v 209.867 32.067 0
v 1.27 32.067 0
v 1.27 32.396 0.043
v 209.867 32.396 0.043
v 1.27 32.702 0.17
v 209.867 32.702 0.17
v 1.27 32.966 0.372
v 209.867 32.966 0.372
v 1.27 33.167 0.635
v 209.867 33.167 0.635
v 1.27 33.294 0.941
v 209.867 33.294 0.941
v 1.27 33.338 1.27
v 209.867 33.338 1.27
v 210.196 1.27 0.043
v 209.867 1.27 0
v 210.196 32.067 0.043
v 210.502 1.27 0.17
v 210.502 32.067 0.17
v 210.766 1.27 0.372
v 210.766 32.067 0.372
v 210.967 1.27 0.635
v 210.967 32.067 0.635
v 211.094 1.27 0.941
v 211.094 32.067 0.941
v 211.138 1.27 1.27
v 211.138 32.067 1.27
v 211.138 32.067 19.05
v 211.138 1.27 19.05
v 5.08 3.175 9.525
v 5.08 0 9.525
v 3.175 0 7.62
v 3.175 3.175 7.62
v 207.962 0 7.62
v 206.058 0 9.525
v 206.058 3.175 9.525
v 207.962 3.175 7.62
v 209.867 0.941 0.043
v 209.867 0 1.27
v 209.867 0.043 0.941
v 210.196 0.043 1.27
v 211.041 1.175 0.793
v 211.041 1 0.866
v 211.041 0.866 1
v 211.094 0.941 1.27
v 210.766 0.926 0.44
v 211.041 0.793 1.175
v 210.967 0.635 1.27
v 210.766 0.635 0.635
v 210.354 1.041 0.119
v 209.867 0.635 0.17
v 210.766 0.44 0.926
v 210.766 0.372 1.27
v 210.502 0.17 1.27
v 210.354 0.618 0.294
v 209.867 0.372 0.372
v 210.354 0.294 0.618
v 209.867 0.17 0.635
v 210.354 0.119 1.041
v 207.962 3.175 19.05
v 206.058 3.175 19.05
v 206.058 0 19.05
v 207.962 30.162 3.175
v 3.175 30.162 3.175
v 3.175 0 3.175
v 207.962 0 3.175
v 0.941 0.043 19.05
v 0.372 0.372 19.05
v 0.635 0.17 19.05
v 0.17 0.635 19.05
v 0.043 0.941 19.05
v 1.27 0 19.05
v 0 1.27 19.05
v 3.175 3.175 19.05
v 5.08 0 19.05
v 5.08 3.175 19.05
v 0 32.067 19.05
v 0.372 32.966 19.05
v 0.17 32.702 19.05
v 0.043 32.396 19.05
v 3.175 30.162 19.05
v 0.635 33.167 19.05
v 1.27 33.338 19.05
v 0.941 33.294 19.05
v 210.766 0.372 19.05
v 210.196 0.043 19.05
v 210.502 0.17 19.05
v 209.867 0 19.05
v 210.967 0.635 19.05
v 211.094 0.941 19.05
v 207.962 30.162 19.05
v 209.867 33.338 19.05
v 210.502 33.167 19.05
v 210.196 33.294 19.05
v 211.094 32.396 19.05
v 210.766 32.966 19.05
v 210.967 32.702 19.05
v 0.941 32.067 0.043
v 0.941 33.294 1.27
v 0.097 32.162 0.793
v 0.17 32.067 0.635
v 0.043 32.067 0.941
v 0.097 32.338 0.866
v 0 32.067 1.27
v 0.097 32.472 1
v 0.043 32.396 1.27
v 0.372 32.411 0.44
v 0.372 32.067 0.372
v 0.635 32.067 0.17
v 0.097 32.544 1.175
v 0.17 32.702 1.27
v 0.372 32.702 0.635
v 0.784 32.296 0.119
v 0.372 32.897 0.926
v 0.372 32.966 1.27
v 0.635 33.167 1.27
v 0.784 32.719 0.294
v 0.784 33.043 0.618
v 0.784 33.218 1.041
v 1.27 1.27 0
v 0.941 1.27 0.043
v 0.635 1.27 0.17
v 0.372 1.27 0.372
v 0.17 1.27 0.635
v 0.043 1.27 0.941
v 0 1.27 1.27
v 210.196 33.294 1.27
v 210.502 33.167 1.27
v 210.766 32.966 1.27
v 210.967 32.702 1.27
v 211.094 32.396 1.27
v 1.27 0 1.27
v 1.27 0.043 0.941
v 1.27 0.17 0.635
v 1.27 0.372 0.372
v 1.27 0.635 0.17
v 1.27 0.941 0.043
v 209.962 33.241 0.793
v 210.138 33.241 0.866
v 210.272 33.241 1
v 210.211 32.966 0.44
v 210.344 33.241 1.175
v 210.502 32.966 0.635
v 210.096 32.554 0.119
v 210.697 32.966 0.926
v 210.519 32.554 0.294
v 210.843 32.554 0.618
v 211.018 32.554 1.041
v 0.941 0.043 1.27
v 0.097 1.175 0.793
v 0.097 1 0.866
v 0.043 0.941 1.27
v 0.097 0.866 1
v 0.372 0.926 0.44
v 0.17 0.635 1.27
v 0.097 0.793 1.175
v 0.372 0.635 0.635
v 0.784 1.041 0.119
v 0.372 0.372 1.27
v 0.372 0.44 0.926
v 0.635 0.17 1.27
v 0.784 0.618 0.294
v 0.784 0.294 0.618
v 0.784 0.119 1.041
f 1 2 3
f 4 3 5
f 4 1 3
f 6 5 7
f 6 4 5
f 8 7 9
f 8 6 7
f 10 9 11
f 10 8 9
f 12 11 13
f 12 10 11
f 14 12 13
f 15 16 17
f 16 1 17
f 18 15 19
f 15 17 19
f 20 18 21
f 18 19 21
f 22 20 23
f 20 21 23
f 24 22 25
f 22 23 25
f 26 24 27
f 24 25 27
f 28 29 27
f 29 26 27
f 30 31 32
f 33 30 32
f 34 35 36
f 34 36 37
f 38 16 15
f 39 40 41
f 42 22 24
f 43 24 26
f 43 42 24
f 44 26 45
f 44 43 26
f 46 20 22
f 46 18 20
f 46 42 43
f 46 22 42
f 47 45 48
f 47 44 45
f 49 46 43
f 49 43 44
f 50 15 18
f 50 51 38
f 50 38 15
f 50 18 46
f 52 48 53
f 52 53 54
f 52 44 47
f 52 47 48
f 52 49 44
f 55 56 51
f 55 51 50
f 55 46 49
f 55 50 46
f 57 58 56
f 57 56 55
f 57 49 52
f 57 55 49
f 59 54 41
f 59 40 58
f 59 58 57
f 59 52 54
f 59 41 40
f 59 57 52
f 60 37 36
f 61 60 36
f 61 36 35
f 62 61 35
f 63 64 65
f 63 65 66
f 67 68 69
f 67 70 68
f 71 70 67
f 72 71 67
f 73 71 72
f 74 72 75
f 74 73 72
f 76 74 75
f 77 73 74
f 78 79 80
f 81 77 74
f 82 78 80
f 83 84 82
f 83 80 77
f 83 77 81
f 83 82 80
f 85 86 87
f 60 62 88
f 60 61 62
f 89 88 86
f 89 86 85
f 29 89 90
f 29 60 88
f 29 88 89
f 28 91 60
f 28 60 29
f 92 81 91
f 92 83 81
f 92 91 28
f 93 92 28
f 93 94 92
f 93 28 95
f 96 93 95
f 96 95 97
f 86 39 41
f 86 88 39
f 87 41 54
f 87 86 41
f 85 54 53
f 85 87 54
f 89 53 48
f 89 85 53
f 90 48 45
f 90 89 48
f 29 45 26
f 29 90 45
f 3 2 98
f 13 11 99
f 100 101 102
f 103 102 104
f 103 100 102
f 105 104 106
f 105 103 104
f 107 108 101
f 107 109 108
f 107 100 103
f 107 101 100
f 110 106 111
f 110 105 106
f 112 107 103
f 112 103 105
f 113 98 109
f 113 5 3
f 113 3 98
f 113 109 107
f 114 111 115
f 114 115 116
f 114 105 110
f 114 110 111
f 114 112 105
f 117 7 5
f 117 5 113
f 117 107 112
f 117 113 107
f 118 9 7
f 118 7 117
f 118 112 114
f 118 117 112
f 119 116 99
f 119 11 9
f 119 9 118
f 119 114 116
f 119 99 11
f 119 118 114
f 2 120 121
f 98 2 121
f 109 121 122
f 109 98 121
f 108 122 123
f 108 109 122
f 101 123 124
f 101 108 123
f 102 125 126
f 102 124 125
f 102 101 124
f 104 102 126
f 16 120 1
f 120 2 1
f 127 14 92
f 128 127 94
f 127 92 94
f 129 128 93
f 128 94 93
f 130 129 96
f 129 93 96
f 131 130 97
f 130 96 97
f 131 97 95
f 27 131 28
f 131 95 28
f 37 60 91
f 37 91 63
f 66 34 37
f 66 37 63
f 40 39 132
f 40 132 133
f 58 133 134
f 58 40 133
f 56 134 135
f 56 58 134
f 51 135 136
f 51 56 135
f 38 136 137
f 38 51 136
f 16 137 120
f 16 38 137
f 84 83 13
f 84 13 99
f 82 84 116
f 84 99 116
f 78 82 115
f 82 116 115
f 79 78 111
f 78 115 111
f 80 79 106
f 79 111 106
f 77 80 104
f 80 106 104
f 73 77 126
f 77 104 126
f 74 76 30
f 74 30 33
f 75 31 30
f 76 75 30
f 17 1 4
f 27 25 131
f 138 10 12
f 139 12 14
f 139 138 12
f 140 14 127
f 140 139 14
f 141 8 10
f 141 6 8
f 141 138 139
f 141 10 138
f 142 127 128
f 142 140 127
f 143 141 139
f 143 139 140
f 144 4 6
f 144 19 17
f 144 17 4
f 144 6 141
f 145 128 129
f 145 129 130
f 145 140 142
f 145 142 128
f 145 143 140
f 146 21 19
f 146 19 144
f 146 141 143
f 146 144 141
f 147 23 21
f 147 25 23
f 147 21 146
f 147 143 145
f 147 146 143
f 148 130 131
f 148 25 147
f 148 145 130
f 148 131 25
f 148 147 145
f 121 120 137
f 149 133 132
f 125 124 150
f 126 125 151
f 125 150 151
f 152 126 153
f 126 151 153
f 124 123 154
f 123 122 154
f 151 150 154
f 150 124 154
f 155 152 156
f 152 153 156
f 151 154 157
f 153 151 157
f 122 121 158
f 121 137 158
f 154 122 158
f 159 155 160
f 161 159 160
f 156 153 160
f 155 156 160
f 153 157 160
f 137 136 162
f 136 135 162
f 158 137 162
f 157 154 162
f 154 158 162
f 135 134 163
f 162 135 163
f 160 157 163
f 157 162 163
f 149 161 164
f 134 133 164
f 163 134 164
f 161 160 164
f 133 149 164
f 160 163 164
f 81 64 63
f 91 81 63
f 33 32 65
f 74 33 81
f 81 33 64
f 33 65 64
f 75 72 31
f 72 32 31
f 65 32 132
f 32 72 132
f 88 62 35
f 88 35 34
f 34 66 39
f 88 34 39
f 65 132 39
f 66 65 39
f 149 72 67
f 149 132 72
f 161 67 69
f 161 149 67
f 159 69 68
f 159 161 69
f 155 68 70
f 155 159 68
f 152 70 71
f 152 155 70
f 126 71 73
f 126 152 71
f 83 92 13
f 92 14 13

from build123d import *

# Parameters (mm, degrees)
SKETCH1_W           = 211.1375
SKETCH1_H           = 33.3375
BOSS_EXTRUDE1_DEPTH = 3.175
BOSS_EXTRUDE2_DEPTH = 15.875
CUT_EXTRUDE1_REACH  = 216.6
FILLET1_R           = 1.27


with BuildPart() as part:
    # Sketch1 → Boss-Extrude1 (new body)
    with BuildSketch(Plane.XY):
        with Locations((105.56875, 16.66875)):
            Rectangle(SKETCH1_W, SKETCH1_H)
    extrude(amount=BOSS_EXTRUDE1_DEPTH)

    # Sketch2 → Boss-Extrude2 (add)
    with BuildSketch(Plane.XY.offset(3.175)):
        Polygon((5.08, 0), (5.08, 3.175), (3.175, 3.175), (3.175, 30.1625), (207.9625, 30.1625), (207.9625, 3.175), (206.0575, 3.175), (206.0575, 0), (211.1375, 0), (211.1375, 33.3375), (0, 33.3375), (0, 0), align=None)
    extrude(amount=BOSS_EXTRUDE2_DEPTH)

    # Sketch3 → Cut-Extrude1 (cut, up to next)
    with BuildSketch(Plane.XZ, mode=Mode.PRIVATE) as cut_extrude1_sk1:
        Polygon((207.9625, 3.175), (206.0575, 3.175), (206.0575, 9.525), (207.9625, 7.62), align=None)
    cut_extrude1_tool1 = extrude(cut_extrude1_sk1.sketch, amount=-CUT_EXTRUDE1_REACH, mode=Mode.PRIVATE) & part.part
    # Sketch3 → Cut-Extrude1 (cut, up to next)
    with BuildSketch(Plane.XZ, mode=Mode.PRIVATE) as cut_extrude1_sk2:
        Polygon((5.08, 9.525), (3.175, 7.62), (3.175, 3.175), (5.08, 3.175), align=None)
    cut_extrude1_tool2 = extrude(cut_extrude1_sk2.sketch, amount=-CUT_EXTRUDE1_REACH, mode=Mode.PRIVATE) & part.part
    add(cut_extrude1_tool1.solids().sort_by_distance((206.953971, 0, 5.901765))[0], mode=Mode.SUBTRACT)
    add(cut_extrude1_tool2.solids().sort_by_distance((4.183529, 0, 5.901765))[0], mode=Mode.SUBTRACT)

    # Fillet1
    fillet1_edges = [part.edges().sort_by_distance(p)[0] for p in [
        (105.56875, 0, 0),
        (211.1375, 16.66875, 0),
        (105.56875, 33.3375, 0),
        (0, 16.66875, 0),
        (0, 0, 9.525),
        (211.1375, 0, 9.525),
        (211.1375, 33.3375, 9.525),
        (0, 33.3375, 9.525),
    ]]
    fillet(fillet1_edges, radius=FILLET1_R)


solid = part.part
